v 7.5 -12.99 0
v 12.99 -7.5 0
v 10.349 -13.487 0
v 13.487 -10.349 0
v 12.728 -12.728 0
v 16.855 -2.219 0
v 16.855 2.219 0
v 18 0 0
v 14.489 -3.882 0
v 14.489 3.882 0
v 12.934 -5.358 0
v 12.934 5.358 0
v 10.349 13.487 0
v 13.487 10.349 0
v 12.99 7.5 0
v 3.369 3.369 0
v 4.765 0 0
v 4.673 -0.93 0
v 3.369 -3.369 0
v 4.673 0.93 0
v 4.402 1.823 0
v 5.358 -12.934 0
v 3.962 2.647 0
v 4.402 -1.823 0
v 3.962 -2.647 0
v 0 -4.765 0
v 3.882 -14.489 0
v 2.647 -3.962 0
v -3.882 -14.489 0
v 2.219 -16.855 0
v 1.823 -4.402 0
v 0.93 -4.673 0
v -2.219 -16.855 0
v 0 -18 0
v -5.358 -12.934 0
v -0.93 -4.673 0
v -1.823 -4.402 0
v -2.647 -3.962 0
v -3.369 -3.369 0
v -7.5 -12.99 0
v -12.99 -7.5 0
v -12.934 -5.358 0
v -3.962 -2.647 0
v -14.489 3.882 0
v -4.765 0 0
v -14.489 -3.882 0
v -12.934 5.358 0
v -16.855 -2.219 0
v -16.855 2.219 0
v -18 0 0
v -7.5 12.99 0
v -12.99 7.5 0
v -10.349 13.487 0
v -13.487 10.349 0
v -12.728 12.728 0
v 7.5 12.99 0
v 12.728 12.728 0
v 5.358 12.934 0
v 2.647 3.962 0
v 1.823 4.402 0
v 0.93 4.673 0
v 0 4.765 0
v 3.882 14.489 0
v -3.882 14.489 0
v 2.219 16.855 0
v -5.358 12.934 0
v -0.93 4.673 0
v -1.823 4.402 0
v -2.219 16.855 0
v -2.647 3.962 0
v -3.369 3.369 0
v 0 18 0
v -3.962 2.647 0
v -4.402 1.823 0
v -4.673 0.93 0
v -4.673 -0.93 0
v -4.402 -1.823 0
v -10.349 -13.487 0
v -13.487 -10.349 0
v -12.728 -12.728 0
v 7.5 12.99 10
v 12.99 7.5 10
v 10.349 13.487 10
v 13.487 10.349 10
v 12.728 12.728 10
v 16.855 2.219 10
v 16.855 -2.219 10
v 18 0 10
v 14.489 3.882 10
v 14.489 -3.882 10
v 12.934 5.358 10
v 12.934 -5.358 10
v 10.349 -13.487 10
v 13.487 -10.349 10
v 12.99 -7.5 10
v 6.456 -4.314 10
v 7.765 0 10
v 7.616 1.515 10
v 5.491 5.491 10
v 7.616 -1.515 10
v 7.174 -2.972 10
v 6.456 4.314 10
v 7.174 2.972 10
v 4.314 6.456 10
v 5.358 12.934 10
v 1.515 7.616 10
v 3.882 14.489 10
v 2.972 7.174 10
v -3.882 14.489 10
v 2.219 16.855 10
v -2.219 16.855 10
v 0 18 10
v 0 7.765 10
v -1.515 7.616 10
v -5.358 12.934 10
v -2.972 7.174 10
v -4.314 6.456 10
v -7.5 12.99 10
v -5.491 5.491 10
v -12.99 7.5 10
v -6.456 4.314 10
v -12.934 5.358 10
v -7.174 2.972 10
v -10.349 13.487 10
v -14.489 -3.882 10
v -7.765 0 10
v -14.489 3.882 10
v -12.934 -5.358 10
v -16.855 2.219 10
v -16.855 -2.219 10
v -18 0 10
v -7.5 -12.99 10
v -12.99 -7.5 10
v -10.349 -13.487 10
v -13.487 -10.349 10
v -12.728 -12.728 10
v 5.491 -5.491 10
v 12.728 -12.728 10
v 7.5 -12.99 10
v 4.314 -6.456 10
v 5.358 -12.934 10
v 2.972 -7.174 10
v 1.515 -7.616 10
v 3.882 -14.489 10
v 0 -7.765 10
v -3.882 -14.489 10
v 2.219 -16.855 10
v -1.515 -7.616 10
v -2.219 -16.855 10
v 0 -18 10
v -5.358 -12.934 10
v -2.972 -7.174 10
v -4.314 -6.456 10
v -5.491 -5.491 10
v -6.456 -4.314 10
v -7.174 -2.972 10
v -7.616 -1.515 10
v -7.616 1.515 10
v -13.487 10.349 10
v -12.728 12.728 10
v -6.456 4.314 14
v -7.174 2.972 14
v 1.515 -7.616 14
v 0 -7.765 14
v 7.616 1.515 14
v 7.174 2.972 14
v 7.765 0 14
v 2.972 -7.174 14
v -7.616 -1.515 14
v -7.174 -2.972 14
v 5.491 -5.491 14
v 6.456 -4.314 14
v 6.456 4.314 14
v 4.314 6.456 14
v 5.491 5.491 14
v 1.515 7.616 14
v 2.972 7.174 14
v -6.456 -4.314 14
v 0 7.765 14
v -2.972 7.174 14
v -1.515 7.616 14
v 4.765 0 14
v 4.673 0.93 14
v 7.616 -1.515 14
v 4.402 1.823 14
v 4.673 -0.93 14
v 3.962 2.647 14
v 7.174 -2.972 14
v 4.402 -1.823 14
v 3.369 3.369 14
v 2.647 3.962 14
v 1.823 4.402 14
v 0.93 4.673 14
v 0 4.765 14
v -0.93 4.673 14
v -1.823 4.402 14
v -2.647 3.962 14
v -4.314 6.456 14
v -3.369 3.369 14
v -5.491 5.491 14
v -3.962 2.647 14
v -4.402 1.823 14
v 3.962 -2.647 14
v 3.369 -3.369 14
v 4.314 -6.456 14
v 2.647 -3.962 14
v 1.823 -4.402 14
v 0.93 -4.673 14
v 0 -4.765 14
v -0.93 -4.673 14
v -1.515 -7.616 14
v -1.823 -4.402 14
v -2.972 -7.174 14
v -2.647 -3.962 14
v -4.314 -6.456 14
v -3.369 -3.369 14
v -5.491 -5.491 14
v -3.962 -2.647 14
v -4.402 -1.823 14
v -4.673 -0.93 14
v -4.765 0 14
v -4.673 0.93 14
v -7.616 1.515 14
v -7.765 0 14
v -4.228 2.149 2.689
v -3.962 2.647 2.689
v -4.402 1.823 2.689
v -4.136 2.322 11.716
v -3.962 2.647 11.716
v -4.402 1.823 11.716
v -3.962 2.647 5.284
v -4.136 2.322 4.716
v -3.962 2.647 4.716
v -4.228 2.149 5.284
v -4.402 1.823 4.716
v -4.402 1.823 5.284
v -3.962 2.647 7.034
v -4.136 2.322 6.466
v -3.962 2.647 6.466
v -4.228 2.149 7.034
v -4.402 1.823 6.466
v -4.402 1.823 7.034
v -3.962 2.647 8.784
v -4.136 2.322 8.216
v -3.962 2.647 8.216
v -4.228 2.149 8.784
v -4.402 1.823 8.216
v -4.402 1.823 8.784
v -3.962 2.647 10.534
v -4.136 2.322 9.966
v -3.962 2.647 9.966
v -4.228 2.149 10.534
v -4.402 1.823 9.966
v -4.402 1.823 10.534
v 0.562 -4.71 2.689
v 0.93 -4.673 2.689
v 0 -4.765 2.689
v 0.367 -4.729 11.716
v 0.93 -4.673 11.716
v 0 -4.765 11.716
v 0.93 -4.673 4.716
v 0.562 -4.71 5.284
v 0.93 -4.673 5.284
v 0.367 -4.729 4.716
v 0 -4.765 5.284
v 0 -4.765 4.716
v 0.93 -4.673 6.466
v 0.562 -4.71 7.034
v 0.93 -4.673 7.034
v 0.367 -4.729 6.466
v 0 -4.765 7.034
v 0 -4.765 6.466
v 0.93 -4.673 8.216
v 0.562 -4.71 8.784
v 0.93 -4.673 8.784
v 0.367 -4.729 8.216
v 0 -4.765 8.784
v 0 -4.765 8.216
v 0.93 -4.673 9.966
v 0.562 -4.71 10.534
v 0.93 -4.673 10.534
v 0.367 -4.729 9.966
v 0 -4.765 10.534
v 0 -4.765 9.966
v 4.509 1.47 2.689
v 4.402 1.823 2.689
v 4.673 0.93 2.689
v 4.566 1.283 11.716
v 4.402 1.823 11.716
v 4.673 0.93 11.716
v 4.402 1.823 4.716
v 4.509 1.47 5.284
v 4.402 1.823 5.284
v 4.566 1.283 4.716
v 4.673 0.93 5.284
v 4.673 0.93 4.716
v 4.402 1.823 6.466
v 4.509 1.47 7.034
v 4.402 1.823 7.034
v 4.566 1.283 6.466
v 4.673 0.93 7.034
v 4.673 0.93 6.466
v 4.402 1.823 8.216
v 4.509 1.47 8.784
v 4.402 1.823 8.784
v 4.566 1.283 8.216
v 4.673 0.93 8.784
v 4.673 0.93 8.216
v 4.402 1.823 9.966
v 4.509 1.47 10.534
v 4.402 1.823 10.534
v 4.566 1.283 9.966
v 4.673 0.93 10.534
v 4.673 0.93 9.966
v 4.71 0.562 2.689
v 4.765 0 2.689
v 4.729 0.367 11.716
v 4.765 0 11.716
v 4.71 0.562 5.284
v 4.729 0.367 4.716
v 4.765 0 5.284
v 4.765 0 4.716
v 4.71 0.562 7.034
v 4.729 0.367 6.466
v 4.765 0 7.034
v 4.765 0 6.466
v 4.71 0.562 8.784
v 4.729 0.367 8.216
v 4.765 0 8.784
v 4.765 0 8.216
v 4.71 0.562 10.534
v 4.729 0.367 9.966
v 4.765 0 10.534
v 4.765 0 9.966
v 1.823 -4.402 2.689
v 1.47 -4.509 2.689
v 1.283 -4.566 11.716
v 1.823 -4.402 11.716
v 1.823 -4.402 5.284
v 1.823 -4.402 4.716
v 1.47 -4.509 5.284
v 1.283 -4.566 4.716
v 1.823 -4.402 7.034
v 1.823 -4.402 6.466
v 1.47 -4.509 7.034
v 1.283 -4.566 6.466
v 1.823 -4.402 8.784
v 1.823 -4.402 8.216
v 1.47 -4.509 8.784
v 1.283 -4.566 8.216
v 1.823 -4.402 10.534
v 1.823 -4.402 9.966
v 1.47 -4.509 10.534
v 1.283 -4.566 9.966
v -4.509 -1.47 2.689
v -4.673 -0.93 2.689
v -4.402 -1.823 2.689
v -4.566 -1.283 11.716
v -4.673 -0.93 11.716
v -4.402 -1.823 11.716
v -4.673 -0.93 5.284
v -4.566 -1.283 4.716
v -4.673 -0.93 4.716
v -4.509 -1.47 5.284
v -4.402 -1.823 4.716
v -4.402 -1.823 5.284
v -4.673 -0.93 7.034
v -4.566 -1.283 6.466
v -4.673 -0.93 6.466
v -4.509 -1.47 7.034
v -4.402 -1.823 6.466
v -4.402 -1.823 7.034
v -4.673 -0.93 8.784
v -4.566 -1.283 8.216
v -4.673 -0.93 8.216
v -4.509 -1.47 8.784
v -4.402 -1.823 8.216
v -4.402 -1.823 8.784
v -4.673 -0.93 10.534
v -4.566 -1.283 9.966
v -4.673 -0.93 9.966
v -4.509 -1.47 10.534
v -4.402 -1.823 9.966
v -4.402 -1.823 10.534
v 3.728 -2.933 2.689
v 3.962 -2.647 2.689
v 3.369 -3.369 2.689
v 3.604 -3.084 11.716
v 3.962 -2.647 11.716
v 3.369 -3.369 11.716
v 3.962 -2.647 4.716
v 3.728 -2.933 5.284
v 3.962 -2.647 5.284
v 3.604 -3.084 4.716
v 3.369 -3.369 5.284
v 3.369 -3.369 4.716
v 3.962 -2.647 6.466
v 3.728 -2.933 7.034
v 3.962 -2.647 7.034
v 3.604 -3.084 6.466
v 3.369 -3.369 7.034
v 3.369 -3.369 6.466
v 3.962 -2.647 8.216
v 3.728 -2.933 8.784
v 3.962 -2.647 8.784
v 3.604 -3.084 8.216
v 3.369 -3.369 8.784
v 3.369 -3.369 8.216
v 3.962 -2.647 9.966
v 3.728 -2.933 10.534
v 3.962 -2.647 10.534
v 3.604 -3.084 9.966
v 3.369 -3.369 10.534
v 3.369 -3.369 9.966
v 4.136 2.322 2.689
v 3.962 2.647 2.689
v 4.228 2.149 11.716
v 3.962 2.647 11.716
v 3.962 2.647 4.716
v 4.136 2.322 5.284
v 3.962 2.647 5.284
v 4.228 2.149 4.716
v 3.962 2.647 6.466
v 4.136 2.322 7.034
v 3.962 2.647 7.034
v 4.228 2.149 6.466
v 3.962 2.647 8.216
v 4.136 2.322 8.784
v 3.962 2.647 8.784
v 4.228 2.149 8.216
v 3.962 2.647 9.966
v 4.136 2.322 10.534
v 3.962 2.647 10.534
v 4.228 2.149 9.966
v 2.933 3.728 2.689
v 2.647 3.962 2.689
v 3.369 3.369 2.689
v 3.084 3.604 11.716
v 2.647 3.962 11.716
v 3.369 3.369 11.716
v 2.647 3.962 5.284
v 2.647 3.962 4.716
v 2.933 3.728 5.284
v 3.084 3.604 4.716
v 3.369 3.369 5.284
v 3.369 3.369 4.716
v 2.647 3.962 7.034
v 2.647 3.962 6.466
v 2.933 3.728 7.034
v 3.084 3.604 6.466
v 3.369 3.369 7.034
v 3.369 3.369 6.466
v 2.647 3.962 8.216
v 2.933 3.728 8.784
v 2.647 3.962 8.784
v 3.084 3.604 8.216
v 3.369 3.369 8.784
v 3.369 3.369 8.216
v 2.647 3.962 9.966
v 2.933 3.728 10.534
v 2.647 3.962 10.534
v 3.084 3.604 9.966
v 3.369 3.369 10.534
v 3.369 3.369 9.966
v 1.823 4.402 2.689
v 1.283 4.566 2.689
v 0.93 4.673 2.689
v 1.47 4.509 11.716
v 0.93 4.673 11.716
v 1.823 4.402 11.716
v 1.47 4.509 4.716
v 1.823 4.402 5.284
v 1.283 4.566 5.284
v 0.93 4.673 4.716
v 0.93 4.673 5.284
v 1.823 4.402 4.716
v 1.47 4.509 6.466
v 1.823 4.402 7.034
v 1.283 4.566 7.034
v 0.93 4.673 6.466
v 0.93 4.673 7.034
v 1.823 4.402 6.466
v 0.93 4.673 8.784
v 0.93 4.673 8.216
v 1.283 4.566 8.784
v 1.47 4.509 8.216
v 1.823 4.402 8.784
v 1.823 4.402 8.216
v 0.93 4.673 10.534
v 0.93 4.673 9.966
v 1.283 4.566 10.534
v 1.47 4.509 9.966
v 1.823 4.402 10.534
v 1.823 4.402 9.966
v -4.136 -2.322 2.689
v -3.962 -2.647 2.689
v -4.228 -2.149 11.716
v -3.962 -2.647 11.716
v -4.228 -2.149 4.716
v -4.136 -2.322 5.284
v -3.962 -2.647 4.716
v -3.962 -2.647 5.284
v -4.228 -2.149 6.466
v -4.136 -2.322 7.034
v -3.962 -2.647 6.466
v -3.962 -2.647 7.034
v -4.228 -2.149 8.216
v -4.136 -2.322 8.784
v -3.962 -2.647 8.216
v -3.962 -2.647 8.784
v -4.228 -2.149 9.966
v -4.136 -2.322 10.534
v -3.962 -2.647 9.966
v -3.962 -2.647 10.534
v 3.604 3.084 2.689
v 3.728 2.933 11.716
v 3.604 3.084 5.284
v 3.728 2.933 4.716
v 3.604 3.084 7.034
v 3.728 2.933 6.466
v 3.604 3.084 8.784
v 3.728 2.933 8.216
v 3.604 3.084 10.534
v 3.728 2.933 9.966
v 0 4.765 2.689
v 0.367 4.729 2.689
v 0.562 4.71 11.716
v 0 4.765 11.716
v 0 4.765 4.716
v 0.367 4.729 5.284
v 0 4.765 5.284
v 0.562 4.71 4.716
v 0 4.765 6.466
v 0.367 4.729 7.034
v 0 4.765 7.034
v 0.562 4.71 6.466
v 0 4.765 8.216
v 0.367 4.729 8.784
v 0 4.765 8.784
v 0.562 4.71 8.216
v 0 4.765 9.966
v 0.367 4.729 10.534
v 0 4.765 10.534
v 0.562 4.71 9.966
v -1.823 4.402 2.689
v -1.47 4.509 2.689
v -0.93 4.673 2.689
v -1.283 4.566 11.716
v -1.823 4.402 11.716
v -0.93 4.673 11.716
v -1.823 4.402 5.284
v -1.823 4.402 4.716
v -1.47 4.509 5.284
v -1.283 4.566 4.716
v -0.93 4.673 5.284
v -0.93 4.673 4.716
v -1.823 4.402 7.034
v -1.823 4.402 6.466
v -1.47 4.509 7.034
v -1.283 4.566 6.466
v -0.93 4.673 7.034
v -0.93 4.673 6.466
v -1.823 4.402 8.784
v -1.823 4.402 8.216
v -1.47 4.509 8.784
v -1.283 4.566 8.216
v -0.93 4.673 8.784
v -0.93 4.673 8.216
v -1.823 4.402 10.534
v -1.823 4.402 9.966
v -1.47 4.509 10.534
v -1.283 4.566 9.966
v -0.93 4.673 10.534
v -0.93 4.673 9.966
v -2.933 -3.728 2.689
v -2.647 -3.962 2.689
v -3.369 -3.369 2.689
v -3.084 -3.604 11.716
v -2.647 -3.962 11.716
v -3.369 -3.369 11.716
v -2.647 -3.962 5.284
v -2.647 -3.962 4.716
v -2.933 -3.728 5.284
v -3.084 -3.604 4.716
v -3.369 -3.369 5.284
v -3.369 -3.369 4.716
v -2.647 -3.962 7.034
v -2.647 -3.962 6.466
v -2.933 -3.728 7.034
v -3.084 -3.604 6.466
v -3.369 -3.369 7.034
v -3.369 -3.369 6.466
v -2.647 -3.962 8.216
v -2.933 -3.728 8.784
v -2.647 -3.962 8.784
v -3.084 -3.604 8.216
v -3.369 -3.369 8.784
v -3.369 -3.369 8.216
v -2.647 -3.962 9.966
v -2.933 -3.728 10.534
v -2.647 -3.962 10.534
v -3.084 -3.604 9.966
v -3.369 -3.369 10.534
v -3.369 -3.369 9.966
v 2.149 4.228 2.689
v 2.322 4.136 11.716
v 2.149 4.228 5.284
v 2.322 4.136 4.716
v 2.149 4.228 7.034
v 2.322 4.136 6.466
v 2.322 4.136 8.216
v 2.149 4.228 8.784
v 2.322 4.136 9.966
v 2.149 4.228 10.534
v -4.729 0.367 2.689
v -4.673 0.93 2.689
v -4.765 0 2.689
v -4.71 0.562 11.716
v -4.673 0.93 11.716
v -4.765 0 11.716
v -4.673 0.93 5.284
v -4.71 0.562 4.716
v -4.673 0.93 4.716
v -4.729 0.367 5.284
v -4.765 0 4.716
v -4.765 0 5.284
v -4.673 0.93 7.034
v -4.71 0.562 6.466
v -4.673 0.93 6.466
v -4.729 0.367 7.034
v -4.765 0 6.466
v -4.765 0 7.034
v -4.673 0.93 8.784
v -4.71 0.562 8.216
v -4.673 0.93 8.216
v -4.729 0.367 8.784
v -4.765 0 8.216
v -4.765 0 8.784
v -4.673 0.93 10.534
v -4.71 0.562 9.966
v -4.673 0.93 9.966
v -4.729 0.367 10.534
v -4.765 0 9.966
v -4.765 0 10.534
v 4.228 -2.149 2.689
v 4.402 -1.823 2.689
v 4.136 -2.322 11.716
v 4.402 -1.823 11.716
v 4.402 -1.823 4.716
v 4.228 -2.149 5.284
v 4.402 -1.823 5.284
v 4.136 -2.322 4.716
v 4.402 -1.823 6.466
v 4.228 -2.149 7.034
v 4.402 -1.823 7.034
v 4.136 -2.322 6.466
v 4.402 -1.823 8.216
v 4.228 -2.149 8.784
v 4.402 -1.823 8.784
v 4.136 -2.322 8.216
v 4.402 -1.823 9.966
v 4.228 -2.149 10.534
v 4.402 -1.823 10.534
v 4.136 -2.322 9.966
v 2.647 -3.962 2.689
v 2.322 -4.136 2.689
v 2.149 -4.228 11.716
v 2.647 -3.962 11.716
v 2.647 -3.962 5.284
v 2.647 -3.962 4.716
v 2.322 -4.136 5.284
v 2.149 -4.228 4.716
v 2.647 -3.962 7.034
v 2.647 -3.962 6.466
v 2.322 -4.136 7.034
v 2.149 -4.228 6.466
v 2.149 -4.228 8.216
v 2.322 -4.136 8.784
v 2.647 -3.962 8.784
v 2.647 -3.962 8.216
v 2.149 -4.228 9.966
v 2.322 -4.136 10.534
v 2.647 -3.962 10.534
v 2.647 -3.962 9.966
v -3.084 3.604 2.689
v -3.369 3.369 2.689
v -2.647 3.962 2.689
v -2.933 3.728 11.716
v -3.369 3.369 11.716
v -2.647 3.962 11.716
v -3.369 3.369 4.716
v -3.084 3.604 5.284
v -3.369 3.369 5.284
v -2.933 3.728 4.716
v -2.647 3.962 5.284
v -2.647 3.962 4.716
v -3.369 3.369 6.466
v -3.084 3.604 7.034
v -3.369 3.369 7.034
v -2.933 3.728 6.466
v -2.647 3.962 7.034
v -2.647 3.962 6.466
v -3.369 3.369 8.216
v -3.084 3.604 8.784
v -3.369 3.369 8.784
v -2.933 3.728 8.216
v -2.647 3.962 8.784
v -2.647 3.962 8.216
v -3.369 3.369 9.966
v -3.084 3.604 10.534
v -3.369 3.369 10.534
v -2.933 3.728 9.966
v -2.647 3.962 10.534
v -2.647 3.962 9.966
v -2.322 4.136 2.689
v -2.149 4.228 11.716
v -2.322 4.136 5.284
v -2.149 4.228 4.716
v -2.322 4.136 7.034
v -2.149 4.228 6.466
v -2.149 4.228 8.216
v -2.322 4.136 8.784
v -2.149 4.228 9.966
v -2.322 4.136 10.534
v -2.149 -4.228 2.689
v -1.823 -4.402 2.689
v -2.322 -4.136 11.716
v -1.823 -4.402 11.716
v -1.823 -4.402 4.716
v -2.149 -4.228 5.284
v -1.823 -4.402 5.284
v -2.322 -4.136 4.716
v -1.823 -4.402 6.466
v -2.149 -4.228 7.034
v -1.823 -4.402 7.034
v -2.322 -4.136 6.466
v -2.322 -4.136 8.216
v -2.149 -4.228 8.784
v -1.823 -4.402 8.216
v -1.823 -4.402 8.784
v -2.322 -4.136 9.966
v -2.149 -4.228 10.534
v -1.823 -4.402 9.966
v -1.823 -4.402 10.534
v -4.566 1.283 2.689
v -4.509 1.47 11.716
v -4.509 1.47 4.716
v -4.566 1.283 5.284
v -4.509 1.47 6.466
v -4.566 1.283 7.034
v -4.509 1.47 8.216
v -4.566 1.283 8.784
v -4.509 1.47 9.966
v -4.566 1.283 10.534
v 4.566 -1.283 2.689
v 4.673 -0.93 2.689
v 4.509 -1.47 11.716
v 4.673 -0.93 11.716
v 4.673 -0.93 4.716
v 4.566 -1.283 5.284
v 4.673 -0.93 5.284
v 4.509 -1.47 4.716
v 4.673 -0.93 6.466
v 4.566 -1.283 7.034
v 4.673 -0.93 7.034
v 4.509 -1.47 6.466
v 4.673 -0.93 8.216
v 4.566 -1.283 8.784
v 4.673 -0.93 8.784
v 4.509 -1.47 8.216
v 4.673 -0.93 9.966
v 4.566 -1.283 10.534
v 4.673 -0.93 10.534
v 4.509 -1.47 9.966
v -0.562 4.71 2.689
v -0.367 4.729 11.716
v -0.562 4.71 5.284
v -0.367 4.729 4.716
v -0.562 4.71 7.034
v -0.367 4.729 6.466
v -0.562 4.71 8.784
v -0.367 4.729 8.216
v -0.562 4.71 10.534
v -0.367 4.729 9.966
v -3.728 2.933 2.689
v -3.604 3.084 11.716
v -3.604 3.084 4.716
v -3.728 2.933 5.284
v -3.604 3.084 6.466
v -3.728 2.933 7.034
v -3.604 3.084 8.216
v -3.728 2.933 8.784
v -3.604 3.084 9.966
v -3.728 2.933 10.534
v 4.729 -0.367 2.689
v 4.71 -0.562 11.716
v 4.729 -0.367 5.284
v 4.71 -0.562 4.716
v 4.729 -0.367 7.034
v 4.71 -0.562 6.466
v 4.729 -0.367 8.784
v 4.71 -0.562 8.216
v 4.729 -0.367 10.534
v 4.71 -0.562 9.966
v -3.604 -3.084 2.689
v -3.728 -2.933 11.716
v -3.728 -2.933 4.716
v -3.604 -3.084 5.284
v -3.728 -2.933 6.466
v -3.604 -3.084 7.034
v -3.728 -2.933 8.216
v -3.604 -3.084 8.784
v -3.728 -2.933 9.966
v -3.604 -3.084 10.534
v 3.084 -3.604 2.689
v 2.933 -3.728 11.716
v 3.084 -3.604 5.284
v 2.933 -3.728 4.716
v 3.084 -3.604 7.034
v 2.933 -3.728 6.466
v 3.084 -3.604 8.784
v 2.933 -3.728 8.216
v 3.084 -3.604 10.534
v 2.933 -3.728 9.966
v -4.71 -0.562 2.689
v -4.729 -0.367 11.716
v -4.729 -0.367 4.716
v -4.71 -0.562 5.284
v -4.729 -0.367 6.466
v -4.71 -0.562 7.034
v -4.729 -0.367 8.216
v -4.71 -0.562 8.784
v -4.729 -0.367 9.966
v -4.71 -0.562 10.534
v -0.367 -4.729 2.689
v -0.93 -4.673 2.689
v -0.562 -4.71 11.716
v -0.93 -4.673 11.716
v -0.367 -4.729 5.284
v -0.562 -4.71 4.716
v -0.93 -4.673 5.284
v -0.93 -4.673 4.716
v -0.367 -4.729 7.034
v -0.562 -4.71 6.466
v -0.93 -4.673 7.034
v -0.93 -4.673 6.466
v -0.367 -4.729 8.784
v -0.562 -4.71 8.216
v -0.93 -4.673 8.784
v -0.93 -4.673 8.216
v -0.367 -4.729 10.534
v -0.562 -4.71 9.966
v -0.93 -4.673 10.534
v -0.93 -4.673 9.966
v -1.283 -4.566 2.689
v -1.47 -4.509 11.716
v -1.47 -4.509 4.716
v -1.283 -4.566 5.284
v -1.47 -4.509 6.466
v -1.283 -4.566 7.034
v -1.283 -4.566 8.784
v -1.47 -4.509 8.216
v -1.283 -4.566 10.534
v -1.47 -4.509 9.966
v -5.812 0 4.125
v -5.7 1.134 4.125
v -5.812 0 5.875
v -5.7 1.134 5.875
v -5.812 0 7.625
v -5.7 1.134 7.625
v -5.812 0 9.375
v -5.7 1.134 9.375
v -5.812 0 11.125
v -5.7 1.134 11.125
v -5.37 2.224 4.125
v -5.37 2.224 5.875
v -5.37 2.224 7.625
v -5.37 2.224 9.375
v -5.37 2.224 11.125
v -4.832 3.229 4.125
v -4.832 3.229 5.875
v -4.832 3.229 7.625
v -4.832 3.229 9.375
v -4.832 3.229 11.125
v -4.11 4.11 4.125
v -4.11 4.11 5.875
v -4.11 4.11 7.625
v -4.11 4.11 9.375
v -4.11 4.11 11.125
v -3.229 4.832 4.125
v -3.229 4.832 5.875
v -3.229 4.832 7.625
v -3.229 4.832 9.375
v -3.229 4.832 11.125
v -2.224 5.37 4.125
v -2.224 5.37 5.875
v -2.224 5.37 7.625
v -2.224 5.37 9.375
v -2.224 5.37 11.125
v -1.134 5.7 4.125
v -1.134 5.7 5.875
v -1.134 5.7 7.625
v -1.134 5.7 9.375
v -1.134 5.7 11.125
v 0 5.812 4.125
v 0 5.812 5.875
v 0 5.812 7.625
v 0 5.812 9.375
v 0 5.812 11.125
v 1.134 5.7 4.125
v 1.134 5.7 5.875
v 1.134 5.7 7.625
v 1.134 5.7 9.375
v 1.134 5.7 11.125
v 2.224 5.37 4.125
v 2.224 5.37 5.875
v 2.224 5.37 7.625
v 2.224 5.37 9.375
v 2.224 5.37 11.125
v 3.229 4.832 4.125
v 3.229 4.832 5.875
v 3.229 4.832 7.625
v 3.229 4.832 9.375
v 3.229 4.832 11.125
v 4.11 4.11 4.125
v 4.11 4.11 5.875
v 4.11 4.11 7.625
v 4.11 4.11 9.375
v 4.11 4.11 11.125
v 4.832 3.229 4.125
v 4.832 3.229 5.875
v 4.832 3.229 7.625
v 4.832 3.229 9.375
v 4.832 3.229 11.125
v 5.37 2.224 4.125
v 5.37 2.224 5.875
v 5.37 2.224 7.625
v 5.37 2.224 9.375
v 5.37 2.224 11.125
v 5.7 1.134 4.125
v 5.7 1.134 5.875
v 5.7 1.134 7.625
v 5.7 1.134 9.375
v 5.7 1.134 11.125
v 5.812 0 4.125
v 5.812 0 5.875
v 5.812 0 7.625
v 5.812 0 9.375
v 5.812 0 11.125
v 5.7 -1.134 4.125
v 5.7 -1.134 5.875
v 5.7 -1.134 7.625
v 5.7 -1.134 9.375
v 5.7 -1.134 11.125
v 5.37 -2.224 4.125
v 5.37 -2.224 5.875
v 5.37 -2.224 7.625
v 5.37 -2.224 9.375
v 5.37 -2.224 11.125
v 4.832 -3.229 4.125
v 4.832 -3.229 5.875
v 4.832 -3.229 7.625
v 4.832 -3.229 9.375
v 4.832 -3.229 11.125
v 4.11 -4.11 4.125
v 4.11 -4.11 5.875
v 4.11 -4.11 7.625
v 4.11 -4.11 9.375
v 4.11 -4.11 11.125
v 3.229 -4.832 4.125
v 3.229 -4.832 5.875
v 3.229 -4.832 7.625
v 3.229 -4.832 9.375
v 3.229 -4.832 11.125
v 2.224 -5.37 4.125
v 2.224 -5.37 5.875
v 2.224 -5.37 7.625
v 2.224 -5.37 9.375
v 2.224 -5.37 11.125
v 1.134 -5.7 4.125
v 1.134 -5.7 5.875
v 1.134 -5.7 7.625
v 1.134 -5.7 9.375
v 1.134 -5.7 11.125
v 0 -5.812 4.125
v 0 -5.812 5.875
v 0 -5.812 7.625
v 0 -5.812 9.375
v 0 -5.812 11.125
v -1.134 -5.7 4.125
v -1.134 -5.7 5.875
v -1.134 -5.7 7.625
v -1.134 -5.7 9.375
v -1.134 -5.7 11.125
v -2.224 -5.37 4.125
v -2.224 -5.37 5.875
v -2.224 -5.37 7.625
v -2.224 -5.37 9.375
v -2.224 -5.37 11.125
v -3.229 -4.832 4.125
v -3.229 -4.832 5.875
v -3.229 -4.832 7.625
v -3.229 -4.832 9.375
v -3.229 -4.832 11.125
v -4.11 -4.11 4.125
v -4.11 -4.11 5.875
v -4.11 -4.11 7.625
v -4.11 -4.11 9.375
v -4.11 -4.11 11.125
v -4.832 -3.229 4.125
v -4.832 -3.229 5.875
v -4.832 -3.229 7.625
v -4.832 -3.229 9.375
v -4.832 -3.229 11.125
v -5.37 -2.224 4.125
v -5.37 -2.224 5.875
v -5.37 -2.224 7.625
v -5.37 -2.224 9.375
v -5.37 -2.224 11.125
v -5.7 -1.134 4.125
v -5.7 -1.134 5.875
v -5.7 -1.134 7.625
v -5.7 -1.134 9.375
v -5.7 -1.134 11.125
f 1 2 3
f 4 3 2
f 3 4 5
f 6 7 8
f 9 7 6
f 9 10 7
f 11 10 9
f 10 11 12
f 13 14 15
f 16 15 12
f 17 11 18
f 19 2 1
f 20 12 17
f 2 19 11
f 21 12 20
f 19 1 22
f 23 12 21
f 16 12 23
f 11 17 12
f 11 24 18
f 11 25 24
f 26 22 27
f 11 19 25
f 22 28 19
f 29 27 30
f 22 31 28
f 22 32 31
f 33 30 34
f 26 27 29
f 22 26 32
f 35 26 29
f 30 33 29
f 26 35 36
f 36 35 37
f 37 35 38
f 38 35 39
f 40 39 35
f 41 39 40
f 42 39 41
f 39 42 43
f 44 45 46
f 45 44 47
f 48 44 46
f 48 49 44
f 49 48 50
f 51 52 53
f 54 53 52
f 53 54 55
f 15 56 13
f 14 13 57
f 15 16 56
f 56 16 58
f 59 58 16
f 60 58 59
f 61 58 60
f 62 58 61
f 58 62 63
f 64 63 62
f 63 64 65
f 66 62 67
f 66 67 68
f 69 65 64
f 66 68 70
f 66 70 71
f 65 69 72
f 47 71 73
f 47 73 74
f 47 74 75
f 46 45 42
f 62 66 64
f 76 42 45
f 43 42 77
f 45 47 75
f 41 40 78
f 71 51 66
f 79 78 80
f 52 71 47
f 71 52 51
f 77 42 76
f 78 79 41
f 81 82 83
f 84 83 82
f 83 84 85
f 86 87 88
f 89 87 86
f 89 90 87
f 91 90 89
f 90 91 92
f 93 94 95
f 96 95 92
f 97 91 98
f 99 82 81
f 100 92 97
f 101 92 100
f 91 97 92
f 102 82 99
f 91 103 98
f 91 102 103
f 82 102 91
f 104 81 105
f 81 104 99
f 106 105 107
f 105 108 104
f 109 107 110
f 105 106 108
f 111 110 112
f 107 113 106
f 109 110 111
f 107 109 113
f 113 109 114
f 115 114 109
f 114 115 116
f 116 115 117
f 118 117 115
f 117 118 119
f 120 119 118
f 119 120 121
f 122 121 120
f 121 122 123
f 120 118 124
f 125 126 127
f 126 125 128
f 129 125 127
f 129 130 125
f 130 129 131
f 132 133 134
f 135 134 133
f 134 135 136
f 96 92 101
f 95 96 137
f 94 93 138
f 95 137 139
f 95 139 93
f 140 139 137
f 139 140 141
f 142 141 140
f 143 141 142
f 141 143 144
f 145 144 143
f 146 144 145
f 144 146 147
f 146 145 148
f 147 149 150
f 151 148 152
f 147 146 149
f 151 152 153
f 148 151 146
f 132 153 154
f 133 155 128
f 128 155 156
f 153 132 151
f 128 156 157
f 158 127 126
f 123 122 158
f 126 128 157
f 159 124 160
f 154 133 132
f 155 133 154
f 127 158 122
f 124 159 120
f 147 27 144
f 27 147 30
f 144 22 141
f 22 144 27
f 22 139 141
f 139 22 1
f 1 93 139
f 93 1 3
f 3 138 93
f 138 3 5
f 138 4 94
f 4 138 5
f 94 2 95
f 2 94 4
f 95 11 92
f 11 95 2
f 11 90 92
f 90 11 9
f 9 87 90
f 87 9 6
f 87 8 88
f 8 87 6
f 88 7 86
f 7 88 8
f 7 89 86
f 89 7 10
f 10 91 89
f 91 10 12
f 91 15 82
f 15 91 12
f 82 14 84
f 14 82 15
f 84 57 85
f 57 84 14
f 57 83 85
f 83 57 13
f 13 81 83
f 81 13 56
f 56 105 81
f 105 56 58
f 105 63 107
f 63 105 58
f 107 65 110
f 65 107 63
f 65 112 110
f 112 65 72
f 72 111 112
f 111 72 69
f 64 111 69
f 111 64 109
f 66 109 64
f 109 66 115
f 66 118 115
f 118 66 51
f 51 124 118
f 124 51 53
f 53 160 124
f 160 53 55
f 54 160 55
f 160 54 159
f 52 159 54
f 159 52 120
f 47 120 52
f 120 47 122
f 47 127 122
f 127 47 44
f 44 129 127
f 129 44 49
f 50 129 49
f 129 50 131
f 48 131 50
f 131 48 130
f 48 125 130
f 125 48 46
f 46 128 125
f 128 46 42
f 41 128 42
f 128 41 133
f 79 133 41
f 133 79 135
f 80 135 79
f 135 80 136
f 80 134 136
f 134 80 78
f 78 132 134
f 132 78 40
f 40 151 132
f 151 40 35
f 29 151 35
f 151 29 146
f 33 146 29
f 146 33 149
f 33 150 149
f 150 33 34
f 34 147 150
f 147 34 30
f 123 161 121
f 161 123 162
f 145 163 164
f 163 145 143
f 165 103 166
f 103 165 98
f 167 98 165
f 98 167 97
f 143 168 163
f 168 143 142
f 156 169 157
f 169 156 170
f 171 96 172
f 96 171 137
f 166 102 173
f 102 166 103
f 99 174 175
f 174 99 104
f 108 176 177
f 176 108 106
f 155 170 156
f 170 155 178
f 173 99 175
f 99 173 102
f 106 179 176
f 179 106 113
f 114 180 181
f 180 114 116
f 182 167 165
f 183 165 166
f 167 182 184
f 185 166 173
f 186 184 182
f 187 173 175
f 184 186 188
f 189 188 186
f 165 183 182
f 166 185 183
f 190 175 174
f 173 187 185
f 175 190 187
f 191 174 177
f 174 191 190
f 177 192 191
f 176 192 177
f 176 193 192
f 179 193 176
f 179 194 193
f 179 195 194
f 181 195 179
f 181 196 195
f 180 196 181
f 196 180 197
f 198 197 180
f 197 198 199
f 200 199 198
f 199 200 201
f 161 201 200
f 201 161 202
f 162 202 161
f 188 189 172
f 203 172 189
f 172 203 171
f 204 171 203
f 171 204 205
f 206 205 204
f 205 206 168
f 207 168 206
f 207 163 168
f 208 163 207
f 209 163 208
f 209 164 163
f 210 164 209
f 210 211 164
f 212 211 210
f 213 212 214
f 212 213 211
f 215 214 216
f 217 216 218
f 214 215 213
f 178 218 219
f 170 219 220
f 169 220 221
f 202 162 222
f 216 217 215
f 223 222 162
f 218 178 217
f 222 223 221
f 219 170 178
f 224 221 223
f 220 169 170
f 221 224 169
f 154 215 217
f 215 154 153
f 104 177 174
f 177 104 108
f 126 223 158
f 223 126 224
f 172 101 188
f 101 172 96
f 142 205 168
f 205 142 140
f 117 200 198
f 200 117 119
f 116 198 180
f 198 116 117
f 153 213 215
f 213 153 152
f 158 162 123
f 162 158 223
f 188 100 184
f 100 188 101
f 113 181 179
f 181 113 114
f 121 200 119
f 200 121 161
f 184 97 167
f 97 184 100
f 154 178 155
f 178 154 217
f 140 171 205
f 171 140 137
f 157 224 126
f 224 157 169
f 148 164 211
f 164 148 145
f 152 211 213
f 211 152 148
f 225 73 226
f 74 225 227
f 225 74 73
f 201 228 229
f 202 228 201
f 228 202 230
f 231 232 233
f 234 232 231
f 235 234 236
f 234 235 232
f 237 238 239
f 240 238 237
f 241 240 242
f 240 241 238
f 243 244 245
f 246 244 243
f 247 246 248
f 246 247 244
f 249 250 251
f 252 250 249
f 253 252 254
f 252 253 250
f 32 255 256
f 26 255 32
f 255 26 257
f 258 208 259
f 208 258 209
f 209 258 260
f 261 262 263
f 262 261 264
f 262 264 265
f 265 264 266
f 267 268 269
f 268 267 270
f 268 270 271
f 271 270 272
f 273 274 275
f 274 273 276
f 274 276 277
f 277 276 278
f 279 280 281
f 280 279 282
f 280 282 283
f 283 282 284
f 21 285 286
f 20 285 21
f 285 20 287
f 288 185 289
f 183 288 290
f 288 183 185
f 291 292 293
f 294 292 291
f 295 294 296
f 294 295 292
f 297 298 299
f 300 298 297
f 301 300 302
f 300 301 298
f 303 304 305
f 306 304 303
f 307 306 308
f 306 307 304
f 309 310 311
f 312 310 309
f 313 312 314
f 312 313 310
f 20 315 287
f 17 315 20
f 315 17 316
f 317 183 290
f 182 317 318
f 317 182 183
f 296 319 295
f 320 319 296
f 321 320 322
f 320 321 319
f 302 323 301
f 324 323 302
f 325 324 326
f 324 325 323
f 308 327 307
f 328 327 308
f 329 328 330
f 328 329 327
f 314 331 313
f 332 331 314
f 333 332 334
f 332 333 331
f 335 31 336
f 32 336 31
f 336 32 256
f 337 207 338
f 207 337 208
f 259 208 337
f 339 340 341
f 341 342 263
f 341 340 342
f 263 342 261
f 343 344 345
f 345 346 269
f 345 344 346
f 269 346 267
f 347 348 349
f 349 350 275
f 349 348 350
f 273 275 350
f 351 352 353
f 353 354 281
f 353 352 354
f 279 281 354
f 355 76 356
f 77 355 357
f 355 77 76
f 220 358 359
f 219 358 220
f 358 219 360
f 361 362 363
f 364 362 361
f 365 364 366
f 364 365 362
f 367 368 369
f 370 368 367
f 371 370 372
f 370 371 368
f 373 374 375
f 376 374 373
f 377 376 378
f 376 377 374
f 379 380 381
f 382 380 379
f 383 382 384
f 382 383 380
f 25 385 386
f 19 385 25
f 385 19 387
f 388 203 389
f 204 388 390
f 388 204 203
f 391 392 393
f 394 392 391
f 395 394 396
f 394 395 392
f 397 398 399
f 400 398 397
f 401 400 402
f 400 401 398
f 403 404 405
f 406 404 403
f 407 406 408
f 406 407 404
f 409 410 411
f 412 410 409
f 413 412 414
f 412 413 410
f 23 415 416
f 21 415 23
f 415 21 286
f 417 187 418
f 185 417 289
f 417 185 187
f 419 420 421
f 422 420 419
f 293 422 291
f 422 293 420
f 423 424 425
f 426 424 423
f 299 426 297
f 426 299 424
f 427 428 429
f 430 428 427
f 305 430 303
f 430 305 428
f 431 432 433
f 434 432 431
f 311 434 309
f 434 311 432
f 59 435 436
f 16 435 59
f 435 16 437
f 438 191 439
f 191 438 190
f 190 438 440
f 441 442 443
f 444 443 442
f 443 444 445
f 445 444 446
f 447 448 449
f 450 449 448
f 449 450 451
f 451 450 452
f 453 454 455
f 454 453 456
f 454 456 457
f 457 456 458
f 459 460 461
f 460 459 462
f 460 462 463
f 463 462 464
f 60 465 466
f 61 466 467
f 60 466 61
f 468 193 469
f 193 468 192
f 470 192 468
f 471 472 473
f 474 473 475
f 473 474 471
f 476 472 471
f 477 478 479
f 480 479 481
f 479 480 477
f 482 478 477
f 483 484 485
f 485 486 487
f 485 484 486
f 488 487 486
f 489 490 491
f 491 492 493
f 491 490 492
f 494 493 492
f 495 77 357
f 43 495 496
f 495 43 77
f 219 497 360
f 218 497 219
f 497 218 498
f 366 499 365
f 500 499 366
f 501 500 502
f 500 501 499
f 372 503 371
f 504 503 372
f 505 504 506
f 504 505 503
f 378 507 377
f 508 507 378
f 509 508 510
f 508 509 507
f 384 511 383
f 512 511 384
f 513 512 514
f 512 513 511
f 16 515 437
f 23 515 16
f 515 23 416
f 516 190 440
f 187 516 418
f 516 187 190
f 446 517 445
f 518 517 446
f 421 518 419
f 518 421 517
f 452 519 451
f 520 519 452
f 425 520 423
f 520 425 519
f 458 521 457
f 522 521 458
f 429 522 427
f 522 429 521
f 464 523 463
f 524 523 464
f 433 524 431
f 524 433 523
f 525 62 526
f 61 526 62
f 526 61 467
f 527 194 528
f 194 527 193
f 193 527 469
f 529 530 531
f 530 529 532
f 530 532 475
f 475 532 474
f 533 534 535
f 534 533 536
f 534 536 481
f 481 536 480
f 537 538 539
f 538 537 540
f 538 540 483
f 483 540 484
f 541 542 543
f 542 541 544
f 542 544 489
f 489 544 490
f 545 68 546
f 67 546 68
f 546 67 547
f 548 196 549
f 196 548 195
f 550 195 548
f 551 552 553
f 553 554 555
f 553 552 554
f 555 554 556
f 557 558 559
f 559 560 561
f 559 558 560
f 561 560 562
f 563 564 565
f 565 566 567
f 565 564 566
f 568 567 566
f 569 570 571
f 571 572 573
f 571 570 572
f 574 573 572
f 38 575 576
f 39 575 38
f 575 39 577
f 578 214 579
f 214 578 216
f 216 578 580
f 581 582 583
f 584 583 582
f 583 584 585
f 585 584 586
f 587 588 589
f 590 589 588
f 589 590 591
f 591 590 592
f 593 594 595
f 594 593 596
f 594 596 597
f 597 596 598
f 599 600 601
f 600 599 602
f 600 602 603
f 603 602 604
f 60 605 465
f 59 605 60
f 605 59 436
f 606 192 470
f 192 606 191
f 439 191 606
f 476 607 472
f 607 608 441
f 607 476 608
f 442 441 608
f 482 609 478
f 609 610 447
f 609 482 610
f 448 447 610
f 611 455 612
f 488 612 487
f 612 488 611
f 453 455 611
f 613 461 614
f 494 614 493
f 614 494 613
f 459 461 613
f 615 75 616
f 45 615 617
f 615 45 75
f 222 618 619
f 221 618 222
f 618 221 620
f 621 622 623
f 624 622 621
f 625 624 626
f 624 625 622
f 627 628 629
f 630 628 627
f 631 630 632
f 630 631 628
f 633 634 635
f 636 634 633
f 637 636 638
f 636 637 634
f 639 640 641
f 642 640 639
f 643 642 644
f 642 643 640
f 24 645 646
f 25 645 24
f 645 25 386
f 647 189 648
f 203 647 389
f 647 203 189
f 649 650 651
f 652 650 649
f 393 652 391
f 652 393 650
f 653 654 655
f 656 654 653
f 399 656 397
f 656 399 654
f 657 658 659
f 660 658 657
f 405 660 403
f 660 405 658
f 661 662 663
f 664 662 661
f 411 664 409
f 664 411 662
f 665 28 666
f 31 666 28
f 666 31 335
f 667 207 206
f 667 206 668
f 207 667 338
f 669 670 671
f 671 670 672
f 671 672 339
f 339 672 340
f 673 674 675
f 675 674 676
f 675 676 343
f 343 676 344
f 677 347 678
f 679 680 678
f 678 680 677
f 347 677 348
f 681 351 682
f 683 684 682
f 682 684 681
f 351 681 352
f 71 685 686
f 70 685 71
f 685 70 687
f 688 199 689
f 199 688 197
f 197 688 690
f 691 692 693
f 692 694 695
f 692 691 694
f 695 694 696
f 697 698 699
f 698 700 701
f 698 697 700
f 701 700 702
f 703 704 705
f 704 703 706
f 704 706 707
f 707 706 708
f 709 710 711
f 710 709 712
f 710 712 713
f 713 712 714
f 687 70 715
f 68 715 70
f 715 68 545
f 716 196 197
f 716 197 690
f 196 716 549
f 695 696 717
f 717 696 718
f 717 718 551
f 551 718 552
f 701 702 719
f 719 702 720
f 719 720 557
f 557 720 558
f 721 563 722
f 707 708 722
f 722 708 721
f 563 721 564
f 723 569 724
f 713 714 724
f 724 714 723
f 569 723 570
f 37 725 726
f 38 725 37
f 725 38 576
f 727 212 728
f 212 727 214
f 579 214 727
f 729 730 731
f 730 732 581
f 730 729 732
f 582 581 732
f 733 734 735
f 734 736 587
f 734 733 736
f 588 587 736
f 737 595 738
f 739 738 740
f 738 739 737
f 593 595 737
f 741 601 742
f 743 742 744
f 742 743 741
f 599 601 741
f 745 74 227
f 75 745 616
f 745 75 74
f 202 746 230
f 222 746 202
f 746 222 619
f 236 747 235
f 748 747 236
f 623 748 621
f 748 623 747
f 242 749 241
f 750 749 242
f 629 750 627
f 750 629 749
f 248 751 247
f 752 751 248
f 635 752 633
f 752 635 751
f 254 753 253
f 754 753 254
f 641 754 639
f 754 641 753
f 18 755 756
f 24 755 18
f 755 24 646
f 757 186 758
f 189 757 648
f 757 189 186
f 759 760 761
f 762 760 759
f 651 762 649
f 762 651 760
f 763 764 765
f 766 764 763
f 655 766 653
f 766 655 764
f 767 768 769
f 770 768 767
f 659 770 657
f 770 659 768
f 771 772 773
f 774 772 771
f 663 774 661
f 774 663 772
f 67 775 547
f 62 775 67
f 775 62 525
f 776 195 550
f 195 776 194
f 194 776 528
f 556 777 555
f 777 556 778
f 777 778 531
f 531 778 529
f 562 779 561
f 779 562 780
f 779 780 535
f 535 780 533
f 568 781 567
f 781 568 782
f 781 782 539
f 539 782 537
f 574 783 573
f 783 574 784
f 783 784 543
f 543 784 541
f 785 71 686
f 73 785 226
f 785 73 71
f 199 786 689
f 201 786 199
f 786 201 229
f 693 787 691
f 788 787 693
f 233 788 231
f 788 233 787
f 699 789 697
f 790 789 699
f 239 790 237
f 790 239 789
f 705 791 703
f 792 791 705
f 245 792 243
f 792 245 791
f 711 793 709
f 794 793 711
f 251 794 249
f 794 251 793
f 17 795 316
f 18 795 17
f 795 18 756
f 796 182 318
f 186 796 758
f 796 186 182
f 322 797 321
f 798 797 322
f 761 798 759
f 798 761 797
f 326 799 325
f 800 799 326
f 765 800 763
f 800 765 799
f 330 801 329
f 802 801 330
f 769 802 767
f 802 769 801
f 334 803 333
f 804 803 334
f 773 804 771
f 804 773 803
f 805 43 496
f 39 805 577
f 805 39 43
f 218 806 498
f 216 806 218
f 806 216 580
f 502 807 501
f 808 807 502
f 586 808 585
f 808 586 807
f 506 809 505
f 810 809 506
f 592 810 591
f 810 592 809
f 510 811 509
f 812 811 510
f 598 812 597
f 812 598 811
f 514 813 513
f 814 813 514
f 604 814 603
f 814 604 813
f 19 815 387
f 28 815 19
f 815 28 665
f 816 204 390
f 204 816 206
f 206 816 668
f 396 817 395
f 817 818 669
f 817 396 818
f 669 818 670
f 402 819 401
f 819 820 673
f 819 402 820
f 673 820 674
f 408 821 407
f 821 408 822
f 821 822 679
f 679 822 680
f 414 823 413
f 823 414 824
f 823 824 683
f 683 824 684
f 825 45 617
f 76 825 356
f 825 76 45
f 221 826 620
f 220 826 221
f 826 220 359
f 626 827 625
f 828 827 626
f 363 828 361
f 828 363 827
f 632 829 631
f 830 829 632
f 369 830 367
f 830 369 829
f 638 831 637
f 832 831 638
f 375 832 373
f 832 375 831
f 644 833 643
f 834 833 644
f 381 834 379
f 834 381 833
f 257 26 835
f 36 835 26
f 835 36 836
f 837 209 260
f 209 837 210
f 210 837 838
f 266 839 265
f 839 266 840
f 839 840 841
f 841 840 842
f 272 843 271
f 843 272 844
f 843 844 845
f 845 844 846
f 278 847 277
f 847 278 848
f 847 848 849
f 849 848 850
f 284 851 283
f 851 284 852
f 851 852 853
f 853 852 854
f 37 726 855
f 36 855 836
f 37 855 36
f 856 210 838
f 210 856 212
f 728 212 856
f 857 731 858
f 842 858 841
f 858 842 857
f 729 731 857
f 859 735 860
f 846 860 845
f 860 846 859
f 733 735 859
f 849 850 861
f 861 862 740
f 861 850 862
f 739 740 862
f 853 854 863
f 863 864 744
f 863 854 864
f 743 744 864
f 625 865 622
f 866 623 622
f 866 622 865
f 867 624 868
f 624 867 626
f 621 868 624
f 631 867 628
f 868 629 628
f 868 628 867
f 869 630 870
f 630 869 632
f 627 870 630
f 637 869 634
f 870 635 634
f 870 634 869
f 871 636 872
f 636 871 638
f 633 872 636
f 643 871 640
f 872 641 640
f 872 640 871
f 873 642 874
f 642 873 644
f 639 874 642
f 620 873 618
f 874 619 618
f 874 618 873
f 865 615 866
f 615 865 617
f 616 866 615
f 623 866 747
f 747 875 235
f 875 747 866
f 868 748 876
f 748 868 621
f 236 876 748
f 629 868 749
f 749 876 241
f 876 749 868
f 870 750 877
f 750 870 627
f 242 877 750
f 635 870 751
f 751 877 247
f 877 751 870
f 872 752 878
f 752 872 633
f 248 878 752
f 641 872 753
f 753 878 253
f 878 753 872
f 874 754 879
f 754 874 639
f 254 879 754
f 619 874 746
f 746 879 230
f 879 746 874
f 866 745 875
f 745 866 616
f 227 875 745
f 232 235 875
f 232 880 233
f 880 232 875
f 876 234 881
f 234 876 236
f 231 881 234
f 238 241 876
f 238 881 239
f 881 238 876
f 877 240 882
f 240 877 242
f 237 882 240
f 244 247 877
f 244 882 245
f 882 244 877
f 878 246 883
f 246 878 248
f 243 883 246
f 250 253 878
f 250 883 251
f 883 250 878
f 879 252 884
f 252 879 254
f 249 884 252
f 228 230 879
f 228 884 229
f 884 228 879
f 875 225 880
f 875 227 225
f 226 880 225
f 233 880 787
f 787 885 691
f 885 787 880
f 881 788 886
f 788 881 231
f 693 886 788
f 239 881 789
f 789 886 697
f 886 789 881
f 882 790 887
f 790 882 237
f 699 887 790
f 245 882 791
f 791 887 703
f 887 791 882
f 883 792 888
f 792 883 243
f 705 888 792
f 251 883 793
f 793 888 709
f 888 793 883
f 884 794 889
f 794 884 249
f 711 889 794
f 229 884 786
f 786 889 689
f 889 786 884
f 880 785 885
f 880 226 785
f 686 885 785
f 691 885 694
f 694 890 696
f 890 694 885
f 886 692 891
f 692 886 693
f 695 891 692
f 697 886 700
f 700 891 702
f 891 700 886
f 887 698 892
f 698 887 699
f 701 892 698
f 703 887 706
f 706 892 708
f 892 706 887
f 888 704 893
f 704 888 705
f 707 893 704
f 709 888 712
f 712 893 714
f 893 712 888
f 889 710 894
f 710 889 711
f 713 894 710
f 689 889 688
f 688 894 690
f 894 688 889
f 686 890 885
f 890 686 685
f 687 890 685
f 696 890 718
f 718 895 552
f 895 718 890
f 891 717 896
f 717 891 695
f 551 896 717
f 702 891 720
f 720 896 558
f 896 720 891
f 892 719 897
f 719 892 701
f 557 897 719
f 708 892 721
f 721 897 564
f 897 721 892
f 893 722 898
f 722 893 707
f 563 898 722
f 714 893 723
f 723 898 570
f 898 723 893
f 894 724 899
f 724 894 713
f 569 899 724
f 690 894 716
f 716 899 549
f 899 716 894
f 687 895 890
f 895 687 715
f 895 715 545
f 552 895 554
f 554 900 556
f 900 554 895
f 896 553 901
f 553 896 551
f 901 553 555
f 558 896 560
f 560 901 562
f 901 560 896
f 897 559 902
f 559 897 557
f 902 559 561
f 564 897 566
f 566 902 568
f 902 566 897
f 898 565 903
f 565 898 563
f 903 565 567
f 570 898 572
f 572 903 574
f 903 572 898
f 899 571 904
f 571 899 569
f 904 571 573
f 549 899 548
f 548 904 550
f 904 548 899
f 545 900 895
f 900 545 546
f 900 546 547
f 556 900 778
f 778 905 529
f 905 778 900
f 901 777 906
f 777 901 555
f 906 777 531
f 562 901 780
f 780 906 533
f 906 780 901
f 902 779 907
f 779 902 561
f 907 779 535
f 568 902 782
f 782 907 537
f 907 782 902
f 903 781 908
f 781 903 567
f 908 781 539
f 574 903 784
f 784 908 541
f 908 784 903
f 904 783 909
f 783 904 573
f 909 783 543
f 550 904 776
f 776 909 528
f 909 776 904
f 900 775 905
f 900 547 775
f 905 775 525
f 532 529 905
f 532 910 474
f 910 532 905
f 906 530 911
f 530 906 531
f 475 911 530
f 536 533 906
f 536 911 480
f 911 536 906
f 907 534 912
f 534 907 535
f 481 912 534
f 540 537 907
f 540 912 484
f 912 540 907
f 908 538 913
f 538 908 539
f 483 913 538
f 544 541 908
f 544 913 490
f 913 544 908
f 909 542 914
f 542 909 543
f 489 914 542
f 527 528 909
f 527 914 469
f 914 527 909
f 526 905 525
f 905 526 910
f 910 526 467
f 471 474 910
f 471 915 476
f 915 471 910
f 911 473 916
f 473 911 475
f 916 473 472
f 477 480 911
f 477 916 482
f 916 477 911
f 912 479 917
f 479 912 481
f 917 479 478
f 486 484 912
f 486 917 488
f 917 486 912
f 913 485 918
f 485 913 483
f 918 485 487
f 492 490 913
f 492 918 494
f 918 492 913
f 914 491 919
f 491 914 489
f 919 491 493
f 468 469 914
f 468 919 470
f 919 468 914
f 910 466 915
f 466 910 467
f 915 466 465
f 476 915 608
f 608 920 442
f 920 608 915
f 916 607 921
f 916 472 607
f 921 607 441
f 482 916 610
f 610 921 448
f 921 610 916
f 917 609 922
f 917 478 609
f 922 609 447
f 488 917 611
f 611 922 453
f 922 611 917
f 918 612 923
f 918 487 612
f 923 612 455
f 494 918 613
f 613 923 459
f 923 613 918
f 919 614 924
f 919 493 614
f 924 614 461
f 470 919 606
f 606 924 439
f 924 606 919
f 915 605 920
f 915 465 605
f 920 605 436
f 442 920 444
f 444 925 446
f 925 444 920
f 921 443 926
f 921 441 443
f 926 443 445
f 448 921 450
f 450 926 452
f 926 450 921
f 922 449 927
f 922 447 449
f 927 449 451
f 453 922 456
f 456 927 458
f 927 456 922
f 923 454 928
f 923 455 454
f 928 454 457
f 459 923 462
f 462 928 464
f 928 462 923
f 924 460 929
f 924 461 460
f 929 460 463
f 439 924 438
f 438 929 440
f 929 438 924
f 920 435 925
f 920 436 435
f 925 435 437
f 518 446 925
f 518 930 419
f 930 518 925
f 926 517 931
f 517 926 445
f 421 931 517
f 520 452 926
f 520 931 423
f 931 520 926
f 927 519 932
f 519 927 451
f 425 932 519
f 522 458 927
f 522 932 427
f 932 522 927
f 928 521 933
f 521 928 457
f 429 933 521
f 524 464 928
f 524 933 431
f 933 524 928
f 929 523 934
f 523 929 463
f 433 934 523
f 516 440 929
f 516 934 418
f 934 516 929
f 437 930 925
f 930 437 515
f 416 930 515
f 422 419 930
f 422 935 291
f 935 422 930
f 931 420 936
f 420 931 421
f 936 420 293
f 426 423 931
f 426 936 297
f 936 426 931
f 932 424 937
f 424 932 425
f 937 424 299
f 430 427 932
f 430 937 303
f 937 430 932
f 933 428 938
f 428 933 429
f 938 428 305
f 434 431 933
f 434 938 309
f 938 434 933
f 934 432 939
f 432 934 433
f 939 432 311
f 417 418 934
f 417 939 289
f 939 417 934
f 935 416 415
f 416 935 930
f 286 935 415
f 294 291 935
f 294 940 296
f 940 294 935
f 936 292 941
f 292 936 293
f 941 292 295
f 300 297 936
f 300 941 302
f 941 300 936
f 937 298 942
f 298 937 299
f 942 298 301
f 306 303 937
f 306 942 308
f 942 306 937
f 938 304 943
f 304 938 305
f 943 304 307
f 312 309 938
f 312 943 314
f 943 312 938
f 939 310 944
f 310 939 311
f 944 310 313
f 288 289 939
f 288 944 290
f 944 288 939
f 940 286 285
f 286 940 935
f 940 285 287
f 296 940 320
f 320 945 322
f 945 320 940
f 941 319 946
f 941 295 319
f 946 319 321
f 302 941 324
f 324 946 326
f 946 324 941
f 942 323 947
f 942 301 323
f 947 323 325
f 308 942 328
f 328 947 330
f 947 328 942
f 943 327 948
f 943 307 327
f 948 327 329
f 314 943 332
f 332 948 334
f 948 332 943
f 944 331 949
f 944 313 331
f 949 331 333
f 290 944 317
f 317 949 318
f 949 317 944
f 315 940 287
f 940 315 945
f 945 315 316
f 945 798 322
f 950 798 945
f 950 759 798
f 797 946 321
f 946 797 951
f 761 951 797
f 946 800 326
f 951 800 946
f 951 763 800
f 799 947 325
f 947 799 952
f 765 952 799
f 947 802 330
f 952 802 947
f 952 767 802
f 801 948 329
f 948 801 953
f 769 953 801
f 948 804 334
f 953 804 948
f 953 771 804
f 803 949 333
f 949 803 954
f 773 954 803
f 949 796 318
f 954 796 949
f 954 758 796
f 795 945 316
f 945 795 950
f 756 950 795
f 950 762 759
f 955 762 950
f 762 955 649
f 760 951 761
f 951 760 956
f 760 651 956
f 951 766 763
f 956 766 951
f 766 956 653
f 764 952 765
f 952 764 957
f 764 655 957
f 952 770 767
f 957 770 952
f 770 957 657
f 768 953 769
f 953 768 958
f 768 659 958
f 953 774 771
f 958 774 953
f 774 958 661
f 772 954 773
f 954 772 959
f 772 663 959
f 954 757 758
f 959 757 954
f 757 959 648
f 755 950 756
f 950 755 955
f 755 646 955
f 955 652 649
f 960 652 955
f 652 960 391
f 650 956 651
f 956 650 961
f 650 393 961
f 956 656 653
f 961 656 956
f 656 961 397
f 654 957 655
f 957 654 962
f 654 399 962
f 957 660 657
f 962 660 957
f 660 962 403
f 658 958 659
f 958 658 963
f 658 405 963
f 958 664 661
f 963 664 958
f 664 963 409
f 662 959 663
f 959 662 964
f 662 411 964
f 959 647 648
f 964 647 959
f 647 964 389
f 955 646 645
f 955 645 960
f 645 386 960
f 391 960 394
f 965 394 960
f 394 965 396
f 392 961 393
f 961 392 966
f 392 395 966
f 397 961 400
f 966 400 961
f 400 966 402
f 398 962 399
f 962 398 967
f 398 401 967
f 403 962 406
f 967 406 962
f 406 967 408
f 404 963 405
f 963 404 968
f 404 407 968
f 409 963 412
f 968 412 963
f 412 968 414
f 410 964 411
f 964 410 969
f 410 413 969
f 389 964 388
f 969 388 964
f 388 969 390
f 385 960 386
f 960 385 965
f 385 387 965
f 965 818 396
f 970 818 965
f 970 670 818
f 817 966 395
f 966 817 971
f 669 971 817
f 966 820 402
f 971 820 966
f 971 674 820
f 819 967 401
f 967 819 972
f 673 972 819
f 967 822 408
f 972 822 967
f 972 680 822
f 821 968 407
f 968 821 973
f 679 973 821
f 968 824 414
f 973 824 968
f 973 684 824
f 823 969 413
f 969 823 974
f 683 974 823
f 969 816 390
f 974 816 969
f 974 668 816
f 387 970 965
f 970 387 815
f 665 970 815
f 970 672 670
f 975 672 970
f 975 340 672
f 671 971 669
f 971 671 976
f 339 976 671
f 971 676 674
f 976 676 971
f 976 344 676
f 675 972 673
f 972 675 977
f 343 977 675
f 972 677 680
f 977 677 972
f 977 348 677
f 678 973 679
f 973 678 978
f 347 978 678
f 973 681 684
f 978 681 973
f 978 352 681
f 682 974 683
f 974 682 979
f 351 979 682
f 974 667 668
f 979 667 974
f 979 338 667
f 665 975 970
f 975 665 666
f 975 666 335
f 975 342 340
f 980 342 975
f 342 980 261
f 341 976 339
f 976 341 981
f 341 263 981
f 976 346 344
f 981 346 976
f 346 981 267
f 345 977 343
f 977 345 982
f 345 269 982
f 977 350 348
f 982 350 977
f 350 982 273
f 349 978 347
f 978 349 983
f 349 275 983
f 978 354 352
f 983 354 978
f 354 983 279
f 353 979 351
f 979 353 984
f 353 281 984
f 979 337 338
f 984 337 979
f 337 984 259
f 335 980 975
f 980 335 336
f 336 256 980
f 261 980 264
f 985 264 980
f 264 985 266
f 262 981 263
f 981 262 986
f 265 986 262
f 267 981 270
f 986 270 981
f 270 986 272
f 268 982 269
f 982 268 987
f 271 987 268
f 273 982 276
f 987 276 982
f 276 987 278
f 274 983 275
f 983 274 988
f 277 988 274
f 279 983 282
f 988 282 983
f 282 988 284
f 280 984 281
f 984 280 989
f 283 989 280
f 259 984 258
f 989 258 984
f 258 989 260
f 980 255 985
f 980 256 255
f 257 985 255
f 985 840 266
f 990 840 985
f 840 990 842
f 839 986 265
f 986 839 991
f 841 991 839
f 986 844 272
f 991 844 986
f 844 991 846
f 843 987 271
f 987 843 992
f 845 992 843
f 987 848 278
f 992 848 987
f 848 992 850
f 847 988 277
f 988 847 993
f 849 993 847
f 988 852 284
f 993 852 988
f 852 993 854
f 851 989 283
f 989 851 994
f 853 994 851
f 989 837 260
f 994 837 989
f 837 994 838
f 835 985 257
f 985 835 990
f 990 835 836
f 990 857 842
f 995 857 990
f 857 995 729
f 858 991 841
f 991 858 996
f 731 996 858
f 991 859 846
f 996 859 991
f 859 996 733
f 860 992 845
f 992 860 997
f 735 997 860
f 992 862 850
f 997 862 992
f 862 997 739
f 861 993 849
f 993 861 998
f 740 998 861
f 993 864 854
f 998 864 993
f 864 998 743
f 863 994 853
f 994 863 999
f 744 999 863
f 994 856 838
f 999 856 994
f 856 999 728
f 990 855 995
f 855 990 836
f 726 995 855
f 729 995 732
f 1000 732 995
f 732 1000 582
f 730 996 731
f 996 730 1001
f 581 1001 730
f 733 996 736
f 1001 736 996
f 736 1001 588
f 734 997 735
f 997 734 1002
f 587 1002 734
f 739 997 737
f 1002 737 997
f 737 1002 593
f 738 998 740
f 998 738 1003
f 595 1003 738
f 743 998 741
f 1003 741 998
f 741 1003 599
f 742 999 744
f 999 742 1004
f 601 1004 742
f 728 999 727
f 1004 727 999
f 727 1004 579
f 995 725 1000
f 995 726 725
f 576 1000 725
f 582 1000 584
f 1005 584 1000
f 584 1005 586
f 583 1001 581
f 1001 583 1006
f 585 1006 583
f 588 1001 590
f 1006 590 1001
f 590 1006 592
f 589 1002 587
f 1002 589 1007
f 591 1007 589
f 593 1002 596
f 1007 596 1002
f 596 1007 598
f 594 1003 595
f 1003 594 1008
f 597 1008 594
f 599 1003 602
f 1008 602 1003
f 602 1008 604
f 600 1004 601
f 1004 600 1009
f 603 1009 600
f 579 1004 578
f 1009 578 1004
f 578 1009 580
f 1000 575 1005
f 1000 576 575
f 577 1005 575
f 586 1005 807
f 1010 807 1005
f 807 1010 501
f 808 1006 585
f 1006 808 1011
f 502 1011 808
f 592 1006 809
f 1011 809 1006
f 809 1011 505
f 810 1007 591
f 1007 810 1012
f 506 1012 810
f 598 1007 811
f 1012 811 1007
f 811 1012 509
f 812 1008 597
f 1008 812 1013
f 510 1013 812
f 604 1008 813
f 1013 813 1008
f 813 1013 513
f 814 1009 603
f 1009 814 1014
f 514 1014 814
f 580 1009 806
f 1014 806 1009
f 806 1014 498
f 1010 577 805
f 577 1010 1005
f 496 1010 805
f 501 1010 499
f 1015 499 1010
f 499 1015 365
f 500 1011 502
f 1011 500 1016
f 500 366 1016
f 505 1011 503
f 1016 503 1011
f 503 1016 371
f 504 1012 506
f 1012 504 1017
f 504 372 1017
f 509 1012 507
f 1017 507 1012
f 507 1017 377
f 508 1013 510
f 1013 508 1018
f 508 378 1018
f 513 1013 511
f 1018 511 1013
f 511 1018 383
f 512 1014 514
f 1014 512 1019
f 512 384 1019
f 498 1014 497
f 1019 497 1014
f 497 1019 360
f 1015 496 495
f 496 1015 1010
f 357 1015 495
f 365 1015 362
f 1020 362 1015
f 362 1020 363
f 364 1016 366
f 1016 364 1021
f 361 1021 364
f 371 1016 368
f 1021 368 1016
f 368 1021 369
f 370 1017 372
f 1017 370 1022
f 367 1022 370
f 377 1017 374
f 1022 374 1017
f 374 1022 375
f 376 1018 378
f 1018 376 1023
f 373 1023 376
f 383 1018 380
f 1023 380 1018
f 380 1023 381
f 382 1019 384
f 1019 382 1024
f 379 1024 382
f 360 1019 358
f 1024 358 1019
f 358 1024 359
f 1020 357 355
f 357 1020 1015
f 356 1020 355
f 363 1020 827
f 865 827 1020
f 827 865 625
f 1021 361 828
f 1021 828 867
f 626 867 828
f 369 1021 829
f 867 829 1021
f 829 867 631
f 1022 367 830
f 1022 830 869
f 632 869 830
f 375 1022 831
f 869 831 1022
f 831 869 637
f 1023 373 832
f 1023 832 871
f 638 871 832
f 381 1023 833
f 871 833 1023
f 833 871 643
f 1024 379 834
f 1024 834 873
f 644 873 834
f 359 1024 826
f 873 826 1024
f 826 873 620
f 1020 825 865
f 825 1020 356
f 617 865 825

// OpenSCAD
$fn = 32;

// ----------------------------------------------------------------------
// Thumb nut: 8 lobe grip, 14 mm tall, M9.53 thread
// ----------------------------------------------------------------------

// --- parameters (mm) ---
base_r = 16;              // grip base radius
lobe_amp = 2;             // lobe height above the base radius
lobes = 8;                // number of grip lobes
grip_h = 10;              // grip height
boss_d = 15.53;           // threaded boss diameter
boss_h = 4;               // boss height
bore_d = 9.53;            // thread core diameter
pitch = 1.75;             // thread pitch
thread_d = 1.05;          // thread depth

grip = [[18, 0], [16.855, 2.219], [14.489, 3.882], [12.934, 5.358], [12.99, 7.5], [13.487, 10.349], [12.728, 12.728], [10.349, 13.487], [7.5, 12.99], [5.358, 12.934], [3.882, 14.489], [2.219, 16.855], [0, 18], [-2.219, 16.855], [-3.882, 14.489], [-5.358, 12.934], [-7.5, 12.99], [-10.349, 13.487], [-12.728, 12.728], [-13.487, 10.349], [-12.99, 7.5], [-12.934, 5.358], [-14.489, 3.882], [-16.855, 2.219], [-18, 0], [-16.855, -2.219], [-14.489, -3.882], [-12.934, -5.358], [-12.99, -7.5], [-13.487, -10.349], [-12.728, -12.728], [-10.349, -13.487], [-7.5, -12.99], [-5.358, -12.934], [-3.882, -14.489], [-2.219, -16.855], [0, -18], [2.219, -16.855], [3.882, -14.489], [5.358, -12.934], [7.5, -12.99], [10.349, -13.487], [12.728, -12.728], [13.487, -10.349], [12.99, -7.5], [12.934, -5.358], [14.489, -3.882], [16.855, -2.219]];

difference() {
  union() {
    /* grip outline extruded straight up */
    linear_extrude(height = grip_h) polygon(grip);
    /* boss sunk half a millimetre into the grip */
    translate([0, 0, grip_h - 0.5]) cylinder(h = boss_h + 0.5, d = boss_d);
  }
  /* threaded bore through grip and boss */
  translate([0, 0, -2.5]) cylinder(h = grip_h + boss_h + 5, d = bore_d);
  translate([0, 0, 2.0]) rotate_extrude() polygon([[3.763, 0], [3.763, 10], [4.263, 10], [5.812, 9.125], [4.263, 8.25], [5.812, 7.375], [4.263, 6.5], [5.812, 5.625], [4.263, 4.75], [5.812, 3.875], [4.263, 3], [5.812, 2.125], [4.263, 0], [3.763, 0]]);
}
